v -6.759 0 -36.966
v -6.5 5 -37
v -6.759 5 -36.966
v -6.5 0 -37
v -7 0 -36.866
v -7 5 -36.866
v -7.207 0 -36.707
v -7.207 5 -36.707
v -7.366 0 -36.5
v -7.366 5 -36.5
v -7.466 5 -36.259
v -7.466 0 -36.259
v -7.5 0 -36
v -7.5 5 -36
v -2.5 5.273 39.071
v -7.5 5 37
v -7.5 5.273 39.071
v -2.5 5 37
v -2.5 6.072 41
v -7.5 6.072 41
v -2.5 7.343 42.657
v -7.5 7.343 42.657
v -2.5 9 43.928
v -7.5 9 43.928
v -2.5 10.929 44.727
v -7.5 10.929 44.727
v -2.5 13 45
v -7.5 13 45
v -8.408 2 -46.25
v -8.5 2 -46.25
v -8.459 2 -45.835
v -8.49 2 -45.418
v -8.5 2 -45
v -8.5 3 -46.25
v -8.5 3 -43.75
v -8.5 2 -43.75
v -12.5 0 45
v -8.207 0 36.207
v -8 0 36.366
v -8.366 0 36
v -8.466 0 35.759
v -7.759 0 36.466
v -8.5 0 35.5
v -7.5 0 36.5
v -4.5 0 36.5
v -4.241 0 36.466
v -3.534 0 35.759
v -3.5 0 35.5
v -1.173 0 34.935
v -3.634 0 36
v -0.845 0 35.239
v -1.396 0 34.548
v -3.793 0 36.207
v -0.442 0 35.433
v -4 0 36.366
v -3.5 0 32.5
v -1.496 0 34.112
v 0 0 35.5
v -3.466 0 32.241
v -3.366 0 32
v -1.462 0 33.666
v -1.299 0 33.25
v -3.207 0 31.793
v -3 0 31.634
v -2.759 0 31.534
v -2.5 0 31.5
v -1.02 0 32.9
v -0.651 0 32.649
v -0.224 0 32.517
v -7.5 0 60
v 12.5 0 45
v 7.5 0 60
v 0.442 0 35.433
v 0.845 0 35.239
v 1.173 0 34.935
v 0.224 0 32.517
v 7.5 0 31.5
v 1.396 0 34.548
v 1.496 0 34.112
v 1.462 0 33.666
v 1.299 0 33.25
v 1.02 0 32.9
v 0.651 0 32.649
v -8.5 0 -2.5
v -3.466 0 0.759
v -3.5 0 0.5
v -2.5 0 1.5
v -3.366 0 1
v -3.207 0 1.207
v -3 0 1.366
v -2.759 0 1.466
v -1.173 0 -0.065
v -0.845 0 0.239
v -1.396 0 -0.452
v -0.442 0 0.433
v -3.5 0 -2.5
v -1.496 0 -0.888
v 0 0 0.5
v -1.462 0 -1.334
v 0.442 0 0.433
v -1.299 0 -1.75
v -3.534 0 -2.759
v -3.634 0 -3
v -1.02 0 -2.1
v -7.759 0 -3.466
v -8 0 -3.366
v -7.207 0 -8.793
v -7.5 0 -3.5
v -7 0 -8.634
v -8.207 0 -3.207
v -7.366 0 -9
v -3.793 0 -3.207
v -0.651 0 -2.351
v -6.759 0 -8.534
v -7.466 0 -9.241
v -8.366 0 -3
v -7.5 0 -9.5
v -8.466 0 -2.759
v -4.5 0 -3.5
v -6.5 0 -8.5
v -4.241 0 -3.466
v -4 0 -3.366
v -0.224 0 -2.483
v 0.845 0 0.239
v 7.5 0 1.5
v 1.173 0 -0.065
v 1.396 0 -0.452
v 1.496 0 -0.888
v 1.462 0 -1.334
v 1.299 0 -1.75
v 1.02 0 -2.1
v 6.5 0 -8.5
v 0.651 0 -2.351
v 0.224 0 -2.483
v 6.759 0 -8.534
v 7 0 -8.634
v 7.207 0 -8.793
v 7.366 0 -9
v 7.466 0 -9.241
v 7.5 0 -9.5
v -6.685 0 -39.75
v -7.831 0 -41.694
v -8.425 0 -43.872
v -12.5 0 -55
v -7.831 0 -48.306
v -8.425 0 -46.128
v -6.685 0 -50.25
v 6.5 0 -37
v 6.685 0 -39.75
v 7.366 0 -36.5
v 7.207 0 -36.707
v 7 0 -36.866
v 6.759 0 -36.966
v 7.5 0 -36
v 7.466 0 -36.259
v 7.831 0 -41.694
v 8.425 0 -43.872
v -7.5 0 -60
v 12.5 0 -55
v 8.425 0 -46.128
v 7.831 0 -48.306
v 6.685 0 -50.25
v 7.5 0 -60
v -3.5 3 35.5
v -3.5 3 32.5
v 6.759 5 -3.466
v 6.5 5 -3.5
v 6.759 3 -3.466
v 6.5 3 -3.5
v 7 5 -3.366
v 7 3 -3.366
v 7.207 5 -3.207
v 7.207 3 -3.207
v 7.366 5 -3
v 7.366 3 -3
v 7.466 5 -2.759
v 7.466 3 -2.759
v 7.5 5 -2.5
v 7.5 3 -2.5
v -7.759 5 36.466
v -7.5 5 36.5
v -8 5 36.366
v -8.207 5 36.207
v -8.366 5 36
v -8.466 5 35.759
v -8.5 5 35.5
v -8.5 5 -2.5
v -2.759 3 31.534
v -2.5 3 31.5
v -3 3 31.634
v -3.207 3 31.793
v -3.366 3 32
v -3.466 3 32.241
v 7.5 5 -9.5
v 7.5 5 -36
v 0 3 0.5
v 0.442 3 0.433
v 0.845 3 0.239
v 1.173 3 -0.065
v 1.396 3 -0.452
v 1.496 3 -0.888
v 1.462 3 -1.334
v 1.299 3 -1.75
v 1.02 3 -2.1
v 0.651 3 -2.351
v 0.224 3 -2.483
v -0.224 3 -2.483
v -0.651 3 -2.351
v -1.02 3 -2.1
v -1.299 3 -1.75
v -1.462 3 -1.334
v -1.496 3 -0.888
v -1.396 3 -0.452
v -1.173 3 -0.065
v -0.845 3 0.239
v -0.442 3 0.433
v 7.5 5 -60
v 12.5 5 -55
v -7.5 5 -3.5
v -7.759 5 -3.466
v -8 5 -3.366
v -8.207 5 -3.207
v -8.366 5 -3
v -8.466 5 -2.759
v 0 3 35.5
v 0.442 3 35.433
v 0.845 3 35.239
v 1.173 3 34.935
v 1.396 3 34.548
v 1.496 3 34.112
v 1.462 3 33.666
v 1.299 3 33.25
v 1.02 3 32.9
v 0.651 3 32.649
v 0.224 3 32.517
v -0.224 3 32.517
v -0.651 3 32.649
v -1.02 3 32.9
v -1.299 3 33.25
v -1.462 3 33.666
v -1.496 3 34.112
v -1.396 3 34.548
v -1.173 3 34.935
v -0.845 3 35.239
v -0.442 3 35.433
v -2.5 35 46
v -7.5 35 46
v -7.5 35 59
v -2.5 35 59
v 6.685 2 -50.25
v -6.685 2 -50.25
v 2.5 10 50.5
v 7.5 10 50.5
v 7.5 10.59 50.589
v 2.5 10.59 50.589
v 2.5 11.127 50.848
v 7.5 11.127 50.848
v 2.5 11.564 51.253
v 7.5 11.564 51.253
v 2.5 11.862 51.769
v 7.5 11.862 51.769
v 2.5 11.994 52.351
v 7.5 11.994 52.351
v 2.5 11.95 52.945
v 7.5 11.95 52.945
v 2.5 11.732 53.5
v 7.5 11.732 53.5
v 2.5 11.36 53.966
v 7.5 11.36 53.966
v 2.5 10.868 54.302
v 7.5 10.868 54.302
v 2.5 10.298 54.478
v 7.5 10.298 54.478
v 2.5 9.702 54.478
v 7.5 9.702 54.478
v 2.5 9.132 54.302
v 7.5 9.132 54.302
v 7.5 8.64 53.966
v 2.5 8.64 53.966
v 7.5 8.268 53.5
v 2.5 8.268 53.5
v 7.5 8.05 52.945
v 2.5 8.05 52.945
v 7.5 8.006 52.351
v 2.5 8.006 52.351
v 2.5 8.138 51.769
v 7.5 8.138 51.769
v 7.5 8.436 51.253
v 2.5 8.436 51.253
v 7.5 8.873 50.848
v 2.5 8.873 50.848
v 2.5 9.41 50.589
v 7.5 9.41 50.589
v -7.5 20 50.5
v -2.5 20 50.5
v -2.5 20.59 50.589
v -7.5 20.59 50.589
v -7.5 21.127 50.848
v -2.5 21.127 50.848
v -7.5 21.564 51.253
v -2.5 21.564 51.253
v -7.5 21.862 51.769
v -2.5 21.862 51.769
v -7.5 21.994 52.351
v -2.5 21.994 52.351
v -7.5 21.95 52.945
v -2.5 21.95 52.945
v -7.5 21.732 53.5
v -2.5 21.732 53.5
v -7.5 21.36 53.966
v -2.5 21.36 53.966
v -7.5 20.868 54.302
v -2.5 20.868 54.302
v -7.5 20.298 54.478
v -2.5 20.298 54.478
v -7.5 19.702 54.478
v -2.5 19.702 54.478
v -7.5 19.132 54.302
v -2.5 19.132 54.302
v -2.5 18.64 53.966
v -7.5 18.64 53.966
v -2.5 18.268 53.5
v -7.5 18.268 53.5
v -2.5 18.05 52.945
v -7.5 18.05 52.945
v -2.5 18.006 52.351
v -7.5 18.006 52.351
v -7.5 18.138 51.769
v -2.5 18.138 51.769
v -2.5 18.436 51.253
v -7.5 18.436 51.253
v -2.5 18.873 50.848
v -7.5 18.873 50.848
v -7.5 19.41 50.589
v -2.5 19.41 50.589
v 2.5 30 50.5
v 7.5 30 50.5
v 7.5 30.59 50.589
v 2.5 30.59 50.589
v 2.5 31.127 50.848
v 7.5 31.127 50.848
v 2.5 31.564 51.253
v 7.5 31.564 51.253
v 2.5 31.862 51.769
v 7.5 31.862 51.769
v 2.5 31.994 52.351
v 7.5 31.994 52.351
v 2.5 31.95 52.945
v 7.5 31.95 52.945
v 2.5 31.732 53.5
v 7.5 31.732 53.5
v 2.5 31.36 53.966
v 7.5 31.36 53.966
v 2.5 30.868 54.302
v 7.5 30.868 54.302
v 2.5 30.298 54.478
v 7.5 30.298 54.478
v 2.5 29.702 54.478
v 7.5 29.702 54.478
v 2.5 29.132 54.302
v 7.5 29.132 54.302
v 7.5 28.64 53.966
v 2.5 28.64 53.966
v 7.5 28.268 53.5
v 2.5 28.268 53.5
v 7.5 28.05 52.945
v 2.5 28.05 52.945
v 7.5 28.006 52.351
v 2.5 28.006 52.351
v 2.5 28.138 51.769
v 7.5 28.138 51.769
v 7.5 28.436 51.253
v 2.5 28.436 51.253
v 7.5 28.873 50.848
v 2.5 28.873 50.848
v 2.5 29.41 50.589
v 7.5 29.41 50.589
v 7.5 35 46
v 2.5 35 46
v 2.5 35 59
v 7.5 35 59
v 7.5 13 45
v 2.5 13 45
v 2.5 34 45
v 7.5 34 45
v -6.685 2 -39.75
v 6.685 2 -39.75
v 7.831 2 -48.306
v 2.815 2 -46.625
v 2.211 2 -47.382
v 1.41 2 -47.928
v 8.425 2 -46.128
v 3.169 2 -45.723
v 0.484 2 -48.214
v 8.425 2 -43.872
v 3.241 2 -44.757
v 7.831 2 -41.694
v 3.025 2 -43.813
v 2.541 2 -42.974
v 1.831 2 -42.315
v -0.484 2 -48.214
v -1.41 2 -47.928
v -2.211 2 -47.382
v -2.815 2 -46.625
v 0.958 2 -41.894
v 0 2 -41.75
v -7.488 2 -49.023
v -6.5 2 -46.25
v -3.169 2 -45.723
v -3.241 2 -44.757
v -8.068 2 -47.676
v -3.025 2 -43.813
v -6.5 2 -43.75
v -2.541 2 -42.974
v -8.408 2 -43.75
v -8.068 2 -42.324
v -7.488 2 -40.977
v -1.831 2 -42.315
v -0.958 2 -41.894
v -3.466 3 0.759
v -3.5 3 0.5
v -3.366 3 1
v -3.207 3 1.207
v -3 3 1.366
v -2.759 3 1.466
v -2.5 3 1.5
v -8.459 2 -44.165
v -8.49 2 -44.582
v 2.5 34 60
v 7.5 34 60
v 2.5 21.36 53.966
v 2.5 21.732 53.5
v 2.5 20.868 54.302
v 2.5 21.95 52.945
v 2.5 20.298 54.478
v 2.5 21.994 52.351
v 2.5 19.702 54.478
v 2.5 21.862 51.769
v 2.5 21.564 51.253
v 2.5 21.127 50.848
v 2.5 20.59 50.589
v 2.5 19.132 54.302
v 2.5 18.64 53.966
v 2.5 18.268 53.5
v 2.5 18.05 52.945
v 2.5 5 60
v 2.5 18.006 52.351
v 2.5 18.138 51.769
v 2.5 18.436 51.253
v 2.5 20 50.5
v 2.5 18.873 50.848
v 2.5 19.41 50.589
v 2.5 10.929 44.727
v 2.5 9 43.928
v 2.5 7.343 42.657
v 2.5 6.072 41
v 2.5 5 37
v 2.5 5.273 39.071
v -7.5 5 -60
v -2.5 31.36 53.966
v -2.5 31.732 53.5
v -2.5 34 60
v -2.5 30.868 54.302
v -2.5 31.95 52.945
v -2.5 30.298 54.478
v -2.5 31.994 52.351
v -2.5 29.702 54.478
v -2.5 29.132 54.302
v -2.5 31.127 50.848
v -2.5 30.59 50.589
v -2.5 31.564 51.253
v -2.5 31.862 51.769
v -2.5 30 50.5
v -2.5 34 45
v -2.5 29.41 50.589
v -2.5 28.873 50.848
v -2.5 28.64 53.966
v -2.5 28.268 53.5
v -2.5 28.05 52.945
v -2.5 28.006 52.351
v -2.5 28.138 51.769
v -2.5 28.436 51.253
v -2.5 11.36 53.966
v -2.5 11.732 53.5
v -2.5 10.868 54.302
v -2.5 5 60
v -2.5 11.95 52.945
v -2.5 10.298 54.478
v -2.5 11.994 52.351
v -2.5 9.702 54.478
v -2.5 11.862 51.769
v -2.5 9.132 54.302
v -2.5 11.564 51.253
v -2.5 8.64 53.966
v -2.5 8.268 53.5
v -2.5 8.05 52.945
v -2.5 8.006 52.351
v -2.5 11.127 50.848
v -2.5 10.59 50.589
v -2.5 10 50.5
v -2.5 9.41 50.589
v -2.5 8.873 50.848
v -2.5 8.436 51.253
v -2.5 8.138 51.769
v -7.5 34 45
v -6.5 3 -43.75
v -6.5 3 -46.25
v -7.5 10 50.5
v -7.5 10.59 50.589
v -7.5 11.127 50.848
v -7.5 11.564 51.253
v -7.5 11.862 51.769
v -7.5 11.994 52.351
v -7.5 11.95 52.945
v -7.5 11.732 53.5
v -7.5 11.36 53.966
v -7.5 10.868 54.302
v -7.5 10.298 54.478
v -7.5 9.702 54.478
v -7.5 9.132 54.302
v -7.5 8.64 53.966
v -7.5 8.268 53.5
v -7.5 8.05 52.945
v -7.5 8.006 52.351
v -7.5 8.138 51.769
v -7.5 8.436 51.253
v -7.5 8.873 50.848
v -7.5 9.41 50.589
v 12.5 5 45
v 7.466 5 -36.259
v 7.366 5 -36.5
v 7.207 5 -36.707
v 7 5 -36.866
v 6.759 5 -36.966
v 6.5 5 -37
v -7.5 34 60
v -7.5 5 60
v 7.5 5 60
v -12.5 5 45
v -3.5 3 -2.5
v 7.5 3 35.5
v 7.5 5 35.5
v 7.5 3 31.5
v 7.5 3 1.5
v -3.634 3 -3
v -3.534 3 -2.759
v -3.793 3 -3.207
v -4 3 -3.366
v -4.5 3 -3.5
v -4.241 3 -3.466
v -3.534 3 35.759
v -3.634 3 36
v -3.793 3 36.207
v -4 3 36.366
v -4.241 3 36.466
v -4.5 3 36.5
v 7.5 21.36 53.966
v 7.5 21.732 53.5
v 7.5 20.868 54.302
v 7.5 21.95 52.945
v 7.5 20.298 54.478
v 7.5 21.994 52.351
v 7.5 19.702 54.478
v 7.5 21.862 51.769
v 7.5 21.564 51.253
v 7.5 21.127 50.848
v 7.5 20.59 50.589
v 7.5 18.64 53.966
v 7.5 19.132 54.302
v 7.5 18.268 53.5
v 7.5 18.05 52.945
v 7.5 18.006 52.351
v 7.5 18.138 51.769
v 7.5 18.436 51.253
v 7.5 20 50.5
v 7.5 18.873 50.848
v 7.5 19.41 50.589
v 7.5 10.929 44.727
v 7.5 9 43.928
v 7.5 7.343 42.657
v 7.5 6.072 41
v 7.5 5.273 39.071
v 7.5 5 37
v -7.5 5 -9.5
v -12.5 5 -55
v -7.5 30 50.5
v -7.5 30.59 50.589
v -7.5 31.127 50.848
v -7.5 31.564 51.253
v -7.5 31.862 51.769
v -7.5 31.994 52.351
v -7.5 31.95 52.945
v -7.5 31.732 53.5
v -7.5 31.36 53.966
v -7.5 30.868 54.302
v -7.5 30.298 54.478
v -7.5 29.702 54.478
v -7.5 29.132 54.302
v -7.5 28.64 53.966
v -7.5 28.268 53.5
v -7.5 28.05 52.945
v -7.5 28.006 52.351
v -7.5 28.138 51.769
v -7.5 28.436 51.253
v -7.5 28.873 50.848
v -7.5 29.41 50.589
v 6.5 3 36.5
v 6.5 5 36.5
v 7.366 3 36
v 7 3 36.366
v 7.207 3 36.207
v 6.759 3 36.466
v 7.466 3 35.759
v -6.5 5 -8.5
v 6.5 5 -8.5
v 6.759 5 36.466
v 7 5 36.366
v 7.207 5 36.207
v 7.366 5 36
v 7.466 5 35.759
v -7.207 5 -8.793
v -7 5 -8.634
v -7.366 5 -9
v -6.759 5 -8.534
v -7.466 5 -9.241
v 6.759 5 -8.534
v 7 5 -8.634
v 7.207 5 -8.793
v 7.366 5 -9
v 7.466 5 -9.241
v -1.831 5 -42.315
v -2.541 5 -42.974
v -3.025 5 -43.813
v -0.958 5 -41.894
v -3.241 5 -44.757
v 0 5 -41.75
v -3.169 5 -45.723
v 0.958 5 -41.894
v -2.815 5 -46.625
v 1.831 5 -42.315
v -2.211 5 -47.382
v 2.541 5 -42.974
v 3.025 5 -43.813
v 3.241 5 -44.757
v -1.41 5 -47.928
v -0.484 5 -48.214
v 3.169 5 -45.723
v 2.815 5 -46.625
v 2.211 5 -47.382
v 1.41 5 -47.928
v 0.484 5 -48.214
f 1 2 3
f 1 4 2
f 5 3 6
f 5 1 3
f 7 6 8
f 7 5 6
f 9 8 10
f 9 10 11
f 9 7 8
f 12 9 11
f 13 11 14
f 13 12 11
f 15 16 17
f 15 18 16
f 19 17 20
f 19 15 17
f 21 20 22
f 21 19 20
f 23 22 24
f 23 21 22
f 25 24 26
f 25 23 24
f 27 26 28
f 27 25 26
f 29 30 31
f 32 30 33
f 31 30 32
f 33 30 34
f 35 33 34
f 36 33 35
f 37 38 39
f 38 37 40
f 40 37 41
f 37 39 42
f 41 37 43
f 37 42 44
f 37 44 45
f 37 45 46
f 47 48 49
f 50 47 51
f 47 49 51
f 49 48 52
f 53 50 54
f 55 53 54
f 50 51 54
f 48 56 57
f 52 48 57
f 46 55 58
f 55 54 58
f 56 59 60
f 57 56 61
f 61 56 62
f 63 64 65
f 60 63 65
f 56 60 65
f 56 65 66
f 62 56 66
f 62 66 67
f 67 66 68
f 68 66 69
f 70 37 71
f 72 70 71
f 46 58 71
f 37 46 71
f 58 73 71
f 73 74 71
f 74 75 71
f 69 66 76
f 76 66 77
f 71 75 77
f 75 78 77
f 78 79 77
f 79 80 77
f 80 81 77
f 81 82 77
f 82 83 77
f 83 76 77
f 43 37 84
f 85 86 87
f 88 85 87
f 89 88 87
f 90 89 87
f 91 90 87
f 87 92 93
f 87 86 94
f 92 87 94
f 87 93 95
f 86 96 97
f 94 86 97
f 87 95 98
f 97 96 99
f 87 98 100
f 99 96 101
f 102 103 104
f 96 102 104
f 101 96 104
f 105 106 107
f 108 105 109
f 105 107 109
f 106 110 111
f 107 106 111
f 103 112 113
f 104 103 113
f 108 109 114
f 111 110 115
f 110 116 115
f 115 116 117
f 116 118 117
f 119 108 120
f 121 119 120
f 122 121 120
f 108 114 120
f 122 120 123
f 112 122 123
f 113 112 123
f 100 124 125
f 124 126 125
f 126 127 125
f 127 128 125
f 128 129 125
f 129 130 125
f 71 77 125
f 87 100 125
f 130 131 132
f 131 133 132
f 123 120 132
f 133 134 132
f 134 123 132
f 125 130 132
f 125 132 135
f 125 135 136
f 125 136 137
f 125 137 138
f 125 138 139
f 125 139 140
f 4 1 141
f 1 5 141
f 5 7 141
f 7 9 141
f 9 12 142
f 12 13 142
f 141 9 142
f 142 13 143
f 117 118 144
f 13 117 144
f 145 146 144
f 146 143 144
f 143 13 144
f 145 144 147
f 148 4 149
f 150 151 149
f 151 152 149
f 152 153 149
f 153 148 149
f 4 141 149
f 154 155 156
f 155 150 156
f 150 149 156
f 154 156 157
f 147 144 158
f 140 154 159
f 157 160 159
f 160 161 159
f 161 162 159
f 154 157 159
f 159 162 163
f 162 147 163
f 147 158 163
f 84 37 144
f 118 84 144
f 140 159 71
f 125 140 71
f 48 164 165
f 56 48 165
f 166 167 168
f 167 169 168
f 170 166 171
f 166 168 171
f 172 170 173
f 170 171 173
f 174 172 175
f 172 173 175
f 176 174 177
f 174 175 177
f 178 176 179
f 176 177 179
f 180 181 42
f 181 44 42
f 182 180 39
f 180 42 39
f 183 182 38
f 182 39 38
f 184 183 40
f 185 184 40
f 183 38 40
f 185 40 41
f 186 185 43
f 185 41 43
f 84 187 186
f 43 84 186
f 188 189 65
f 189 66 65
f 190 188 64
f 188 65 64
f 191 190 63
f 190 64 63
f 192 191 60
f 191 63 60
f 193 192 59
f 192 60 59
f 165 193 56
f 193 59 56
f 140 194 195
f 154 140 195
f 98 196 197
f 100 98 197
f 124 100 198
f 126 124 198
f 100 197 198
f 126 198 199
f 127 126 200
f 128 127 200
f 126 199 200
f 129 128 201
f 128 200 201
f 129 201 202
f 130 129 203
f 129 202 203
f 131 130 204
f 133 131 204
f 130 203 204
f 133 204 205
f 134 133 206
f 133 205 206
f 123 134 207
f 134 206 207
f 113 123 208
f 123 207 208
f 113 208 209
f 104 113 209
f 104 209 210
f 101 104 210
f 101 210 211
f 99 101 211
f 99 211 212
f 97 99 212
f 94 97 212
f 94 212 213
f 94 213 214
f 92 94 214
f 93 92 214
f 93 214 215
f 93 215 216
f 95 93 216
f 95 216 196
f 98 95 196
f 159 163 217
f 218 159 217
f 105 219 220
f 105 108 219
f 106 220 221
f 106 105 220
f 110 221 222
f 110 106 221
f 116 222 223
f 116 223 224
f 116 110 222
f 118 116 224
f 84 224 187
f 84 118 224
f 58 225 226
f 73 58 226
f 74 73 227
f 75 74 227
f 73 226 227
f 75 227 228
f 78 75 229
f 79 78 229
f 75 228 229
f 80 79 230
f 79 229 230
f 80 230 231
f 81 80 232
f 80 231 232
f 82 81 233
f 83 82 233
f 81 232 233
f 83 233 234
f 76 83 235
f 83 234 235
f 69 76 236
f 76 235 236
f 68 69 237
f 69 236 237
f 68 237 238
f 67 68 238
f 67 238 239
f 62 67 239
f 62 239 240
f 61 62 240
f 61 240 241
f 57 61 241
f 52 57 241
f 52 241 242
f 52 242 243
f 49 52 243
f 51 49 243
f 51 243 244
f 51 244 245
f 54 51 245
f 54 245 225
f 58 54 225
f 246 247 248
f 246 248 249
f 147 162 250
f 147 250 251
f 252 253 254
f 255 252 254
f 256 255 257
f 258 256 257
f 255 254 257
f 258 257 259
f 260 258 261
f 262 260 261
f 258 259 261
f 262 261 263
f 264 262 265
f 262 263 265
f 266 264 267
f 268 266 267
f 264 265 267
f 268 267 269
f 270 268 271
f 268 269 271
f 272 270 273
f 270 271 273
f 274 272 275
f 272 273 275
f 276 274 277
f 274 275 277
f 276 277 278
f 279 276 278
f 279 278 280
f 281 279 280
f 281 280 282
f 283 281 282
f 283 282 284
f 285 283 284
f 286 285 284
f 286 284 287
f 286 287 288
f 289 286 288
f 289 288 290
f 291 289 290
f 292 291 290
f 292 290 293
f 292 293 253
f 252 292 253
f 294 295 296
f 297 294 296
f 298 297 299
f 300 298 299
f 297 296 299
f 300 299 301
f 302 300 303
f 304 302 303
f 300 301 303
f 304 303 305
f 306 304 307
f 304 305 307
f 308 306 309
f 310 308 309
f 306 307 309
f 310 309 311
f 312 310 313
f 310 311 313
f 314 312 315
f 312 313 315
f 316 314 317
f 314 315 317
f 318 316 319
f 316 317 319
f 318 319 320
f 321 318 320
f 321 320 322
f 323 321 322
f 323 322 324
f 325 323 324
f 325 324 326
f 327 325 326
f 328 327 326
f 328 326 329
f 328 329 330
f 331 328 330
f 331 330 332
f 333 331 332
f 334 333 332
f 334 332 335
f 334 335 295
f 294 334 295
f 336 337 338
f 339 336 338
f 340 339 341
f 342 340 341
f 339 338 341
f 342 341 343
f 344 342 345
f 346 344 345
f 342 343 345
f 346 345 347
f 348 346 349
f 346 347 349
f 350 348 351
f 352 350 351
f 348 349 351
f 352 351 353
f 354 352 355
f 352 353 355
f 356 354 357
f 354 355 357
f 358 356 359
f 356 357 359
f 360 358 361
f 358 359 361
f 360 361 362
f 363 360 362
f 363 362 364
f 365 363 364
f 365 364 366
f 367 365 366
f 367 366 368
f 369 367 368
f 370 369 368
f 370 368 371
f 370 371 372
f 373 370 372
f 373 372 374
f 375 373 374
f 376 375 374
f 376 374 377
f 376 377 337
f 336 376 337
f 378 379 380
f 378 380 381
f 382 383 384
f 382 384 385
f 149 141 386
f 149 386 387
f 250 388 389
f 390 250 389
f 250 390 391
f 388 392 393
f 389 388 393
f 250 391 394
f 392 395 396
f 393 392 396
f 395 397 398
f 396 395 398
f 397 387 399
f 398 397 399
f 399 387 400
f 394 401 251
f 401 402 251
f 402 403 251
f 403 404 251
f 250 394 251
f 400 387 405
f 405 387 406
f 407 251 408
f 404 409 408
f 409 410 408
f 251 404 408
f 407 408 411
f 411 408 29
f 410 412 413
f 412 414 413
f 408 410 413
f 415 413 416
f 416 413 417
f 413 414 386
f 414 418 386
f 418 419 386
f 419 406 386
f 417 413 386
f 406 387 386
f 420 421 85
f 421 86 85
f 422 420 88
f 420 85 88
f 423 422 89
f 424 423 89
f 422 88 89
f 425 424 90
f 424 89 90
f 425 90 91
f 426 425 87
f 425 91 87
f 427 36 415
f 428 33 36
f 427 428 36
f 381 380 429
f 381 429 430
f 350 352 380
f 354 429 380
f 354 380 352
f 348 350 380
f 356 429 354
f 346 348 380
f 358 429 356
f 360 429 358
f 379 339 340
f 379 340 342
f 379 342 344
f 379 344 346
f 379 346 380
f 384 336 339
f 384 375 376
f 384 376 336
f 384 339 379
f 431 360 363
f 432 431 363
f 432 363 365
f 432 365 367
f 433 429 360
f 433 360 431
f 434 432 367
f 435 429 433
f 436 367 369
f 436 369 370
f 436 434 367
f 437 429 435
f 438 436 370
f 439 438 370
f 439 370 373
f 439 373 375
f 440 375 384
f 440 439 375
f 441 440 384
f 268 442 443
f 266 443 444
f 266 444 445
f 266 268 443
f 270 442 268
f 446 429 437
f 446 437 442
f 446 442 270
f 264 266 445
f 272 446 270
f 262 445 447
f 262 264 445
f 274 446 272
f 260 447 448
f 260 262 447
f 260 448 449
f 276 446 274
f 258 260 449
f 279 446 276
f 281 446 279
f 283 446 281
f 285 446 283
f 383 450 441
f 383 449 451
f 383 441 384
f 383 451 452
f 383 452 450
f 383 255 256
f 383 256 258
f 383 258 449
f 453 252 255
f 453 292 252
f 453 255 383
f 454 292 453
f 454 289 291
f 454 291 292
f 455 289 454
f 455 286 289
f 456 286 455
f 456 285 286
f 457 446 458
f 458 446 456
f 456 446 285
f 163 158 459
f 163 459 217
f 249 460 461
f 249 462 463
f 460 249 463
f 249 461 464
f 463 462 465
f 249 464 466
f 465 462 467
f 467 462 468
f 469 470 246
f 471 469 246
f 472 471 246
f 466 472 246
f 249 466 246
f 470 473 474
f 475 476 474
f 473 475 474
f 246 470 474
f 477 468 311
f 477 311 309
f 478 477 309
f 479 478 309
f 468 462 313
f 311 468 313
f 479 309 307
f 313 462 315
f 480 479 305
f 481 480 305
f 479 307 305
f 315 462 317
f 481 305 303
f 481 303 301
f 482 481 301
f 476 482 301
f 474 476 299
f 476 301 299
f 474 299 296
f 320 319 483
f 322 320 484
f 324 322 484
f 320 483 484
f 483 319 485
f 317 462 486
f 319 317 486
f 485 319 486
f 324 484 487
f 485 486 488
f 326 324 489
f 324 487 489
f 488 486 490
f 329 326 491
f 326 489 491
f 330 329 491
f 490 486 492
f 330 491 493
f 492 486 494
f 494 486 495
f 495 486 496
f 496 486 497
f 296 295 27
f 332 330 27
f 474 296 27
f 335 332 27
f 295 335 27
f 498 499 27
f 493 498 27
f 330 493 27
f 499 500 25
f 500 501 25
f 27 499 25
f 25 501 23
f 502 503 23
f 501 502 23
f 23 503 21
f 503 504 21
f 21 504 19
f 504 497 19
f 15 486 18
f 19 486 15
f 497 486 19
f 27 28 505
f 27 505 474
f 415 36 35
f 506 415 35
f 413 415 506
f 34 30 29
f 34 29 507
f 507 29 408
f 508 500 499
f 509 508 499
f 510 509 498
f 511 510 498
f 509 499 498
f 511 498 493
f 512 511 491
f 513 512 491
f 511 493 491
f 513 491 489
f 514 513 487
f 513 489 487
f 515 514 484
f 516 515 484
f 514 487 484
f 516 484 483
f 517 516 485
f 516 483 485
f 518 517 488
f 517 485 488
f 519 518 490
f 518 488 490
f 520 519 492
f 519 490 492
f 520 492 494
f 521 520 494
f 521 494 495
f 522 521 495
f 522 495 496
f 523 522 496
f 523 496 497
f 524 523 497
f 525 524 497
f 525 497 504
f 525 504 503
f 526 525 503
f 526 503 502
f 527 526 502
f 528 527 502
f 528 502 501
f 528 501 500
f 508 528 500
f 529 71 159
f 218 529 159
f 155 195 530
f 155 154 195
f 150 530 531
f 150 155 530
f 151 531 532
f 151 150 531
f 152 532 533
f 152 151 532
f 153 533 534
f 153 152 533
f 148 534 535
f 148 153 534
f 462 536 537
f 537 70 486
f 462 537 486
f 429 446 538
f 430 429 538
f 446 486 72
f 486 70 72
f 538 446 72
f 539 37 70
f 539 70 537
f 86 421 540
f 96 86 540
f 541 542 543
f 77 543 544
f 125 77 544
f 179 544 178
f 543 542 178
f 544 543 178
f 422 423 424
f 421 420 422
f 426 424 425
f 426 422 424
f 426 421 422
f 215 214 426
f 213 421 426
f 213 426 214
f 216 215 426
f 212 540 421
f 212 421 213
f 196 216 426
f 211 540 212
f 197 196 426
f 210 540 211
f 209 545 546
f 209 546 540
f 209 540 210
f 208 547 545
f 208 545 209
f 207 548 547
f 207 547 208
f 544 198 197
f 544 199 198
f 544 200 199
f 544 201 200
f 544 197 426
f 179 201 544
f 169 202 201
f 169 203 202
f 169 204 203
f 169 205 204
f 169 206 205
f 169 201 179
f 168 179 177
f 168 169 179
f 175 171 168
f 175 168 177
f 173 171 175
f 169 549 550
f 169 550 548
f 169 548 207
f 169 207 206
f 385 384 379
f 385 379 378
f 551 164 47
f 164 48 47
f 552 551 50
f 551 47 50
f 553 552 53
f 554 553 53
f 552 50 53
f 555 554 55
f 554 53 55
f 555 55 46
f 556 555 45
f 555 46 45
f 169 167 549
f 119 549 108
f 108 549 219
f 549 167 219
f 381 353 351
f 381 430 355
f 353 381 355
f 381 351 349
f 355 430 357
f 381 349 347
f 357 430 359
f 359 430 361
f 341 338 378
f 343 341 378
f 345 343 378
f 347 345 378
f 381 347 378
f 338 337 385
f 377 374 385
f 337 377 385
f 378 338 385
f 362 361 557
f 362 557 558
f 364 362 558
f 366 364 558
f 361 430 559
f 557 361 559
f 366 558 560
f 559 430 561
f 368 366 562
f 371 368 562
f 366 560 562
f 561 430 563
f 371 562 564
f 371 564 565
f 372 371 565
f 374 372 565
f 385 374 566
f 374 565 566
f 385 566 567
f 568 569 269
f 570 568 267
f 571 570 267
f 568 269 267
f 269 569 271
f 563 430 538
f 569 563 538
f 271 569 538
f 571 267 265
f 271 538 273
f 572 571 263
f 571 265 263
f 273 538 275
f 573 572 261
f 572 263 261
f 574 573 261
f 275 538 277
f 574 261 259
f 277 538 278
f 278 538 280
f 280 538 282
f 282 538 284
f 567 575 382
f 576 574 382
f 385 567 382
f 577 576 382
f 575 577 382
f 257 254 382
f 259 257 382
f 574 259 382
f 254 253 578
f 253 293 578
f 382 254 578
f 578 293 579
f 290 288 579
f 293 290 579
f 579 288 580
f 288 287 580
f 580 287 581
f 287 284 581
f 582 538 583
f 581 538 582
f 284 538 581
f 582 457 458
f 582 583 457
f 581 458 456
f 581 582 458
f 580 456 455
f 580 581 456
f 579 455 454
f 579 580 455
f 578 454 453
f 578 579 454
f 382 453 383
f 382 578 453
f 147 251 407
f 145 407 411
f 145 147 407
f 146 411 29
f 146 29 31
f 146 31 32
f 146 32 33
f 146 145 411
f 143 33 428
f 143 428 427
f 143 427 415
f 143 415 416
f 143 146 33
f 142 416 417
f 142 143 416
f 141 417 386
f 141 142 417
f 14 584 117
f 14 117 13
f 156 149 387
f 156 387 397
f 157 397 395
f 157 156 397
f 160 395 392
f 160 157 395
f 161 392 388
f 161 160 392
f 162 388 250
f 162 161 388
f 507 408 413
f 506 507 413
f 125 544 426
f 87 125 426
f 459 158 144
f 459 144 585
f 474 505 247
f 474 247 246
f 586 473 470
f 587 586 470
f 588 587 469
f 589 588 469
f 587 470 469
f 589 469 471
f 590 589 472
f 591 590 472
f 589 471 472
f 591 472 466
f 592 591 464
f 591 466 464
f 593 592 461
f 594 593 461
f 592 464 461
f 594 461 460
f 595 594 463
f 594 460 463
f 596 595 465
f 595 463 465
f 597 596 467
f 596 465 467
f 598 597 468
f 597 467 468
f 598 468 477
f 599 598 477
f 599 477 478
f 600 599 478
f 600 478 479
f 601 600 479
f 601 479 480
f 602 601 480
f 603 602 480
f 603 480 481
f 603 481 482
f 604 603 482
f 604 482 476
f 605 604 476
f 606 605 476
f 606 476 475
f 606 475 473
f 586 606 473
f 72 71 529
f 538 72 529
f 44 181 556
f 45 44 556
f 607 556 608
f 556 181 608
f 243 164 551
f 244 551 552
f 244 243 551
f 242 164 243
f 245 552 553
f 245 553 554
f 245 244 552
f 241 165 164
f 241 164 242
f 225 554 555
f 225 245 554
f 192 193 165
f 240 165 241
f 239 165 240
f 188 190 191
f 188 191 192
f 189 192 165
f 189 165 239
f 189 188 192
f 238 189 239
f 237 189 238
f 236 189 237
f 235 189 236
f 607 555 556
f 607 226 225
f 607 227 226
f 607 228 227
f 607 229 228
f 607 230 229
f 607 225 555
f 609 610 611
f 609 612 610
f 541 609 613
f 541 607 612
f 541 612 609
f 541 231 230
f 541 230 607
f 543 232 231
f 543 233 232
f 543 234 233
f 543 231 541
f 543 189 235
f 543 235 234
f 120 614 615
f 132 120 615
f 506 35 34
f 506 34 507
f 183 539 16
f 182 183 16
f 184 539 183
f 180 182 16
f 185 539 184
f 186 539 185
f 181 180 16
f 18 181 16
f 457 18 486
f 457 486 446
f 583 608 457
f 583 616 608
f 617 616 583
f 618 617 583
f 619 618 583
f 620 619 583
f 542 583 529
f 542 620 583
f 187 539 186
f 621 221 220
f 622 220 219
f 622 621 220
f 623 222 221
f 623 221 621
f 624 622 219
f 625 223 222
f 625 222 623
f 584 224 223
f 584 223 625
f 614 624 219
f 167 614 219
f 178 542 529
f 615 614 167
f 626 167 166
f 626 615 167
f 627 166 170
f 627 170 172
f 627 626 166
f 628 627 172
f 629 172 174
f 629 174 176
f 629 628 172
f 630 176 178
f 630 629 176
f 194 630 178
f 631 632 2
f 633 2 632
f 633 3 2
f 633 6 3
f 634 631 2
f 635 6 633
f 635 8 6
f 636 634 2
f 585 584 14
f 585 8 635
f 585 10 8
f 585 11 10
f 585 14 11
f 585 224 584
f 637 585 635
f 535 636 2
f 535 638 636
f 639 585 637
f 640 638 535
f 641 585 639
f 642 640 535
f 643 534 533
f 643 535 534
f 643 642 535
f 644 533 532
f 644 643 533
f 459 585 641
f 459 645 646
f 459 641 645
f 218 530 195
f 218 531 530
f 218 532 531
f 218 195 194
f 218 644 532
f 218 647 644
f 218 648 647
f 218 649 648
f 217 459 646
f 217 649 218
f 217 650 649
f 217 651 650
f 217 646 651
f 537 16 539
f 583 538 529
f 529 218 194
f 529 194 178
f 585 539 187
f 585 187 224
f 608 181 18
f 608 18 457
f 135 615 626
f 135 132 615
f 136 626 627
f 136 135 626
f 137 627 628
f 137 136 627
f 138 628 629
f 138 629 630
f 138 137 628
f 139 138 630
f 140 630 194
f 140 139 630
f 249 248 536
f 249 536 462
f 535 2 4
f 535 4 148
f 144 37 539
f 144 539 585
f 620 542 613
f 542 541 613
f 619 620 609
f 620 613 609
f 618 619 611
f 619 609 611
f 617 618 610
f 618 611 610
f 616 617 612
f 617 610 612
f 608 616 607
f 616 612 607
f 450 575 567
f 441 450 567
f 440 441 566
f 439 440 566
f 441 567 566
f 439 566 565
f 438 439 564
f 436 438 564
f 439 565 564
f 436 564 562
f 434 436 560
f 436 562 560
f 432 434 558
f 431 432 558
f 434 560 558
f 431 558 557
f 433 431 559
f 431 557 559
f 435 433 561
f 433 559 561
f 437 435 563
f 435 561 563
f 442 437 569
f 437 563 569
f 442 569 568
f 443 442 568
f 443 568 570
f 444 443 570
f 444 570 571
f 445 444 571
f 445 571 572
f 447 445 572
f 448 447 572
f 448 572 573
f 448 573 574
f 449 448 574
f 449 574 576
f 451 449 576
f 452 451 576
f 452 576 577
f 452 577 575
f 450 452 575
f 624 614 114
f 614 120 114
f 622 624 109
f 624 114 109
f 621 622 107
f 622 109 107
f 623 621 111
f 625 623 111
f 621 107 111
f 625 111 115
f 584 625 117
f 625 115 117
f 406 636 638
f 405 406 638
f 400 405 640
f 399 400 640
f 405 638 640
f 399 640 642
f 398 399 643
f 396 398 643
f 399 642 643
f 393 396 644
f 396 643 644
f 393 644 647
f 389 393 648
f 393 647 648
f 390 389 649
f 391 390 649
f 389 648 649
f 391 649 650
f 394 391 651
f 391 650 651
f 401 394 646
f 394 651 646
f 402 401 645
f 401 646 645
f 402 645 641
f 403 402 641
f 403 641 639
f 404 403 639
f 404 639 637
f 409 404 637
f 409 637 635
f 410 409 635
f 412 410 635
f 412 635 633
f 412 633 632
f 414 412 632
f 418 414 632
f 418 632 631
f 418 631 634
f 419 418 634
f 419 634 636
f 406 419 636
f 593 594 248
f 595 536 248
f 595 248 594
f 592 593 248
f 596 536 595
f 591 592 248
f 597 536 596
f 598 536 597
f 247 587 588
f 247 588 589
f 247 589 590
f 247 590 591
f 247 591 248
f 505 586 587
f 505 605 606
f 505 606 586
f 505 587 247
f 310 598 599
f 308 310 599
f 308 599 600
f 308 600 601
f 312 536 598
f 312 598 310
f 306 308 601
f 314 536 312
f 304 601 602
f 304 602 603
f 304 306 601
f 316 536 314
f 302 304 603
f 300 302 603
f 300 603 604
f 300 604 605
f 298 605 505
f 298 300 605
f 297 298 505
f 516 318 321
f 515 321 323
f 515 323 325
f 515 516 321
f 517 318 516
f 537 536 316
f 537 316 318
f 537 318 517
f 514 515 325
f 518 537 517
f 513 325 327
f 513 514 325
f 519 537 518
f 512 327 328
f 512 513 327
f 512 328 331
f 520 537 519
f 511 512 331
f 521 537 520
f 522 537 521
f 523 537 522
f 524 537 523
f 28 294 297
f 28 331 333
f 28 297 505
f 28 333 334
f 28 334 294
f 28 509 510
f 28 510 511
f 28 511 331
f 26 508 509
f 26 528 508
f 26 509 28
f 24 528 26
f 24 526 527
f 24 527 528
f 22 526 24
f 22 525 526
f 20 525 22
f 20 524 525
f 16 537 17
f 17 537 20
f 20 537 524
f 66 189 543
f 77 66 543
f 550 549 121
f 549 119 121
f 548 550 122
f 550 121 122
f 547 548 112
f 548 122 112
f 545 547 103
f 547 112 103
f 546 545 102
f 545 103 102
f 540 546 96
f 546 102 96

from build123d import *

# Parameters (mm, degrees)
SKETCH1_W           = 25
SKETCH1_H           = 120
BOSS_EXTRUDE1_DEPTH = 5
SKETCH2_W           = 5
SKETCH2_H           = 15
BOSS_EXTRUDE2_DEPTH = 30
CHAMFER1_SIZE       = 5
CHAMFER1_SIZE2      = 15
CHAMFER2_SIZE       = 15
CHAMFER2_SIZE2      = 5
CHAMFER3_SIZE       = 1
CHAMFER4_SIZE       = 5
CUT_EXTRUDE1_DEPTH  = 69.23672032
SKETCH3_3_W         = 11
SKETCH3_3_H         = 5
CUT_EXTRUDE2_DEPTH  = 2
FILLET1_R           = 1
SKETCH4_R           = 1.5
CUT_EXTRUDE3_DEPTH  = 70.139352036
FILLET2_R           = 8
SKETCH6_R           = 3.25
CUT_EXTRUDE5_DEPTH  = 69.23672032
CUT_EXTRUDE6_DEPTH  = 2
SKETCH8_W           = 2
SKETCH8_H           = 2.5
CUT_EXTRUDE7_DEPTH  = 1
SKETCH9_R           = 2
CUT_EXTRUDE8_DEPTH  = 73.284161474
SKETCH10_W          = 15
SKETCH10_H          = 28.5
CUT_EXTRUDE9_DEPTH  = 69.23672032
FILLET3_R           = 1


with BuildPart() as part:
    # Sketch1 → Boss-Extrude1 (new body)
    with BuildSketch(Plane(origin=(0, 0, 0), x_dir=(1, 0, 0), z_dir=(0, 1, 0))):
        Rectangle(SKETCH1_W, SKETCH1_H)
    extrude(amount=BOSS_EXTRUDE1_DEPTH)

    # Sketch2 → Boss-Extrude2 (add)
    with BuildSketch(Plane(origin=(0, 5, 0), x_dir=(1, 0, 0), z_dir=(0, 1, 0))):
        with Locations((-5, -52.5)):
            Rectangle(SKETCH2_W, SKETCH2_H)
        with Locations((5, -52.5)):
            Rectangle(SKETCH2_W, SKETCH2_H)
    extrude(amount=BOSS_EXTRUDE2_DEPTH)

    # Chamfer1
    chamfer1_edges = [part.edges().sort_by_distance(p)[0] for p in [
        (12.5, 2.5, 60),
    ]]
    chamfer1_side = [part.faces().sort_by_distance(p)[0] for p in [
        (-12.069883737, 2.5, 60),
    ]]
    chamfer(chamfer1_edges, length=CHAMFER1_SIZE, length2=CHAMFER1_SIZE2, reference=chamfer1_side[0])

    # Chamfer2
    chamfer2_edges = [part.edges().sort_by_distance(p)[0] for p in [
        (-12.5, 2.5, 60),
    ]]
    chamfer2_side = [part.faces().sort_by_distance(p)[0] for p in [
        (-12.5, 2.5, 0),
    ]]
    chamfer(chamfer2_edges, length=CHAMFER2_SIZE, length2=CHAMFER2_SIZE2, reference=chamfer2_side[0])

    # Chamfer3
    chamfer3_edges = [part.edges().sort_by_distance(p)[0] for p in [
        (5, 35, 60),
        (-5, 35, 60),
        (-5, 35, 45),
        (5, 35, 45),
    ]]
    chamfer(chamfer3_edges, length=CHAMFER3_SIZE)

    # Chamfer4
    chamfer4_edges = [part.edges().sort_by_distance(p)[0] for p in [
        (-12.5, 2.5, -60),
        (12.5, 2.5, -60),
    ]]
    chamfer(chamfer4_edges, length=CHAMFER4_SIZE)

    # Sketch3 → Cut-Extrude1 (cut, through all)
    with BuildSketch(Plane(origin=(0, 5, 0), x_dir=(1, 0, 0), z_dir=(0, 1, 0))):
        Polygon((-8.5, 3.5), (-8.5, -36.5), (-3.5, -36.5), (-3.5, -31.5), (7.5, -31.5), (7.5, -1.5), (-3.5, -1.5), (-3.5, 3.5), align=None)
    extrude(amount=-CUT_EXTRUDE1_DEPTH, mode=Mode.SUBTRACT)

    # Sketch3<3> → Cut-Extrude2 (cut)
    with BuildSketch(Plane(origin=(0, 5, 0), x_dir=(1, 0, 0), z_dir=(0, 1, 0))):
        with Locations((2, -34)):
            Rectangle(SKETCH3_3_W, SKETCH3_3_H)
        with Locations((2, 1)):
            Rectangle(SKETCH3_3_W, SKETCH3_3_H)
    extrude(amount=-CUT_EXTRUDE2_DEPTH, mode=Mode.SUBTRACT)

    # Fillet1
    fillet1_edges = [part.edges().sort_by_distance(p)[0] for p in [
        (7.5, 4, 36.5),
        (-3.5, 1.5, 31.5),
        (-3.5, 1.5, 36.5),
        (-8.5, 2.5, 36.5),
        (-3.5, 1.5, 1.5),
        (-3.5, 1.5, -3.5),
        (7.5, 4, -3.5),
        (-8.5, 2.5, -3.5),
    ]]
    fillet(fillet1_edges, radius=FILLET1_R)

    # Sketch4 → Cut-Extrude3 (cut, through all)
    with BuildSketch(Plane(origin=(0, 3, 0), x_dir=(1, 0, 0), z_dir=(0, 1, 0))):
        with Locations((0, 1)):
            Circle(SKETCH4_R)
        with Locations((0, -34)):
            Circle(SKETCH4_R)
    extrude(amount=-CUT_EXTRUDE3_DEPTH, mode=Mode.SUBTRACT)

    # Fillet2
    fillet2_edges = [part.edges().sort_by_distance(p)[0] for p in [
        (-5, 5, 45),
        (5, 5, 45),
    ]]
    fillet(fillet2_edges, radius=FILLET2_R)

    # Sketch6 → Cut-Extrude5 (cut, through all)
    with BuildSketch(Plane(origin=(0, 5, 0), x_dir=(1, 0, 0), z_dir=(0, 1, 0))):
        with Locations((0, 45)):
            Circle(SKETCH6_R)
    extrude(amount=-CUT_EXTRUDE5_DEPTH, mode=Mode.SUBTRACT)

    # Sketch7 → Cut-Extrude6 (cut)
    with BuildSketch(Plane.XZ):
        with BuildLine():
            Line((-6.684870979, -39.75), (6.684870979, -39.75))
            ThreePointArc((6.684870979, -39.75), (8.5, -45), (6.684870979, -50.25))
            Line((6.684870979, -50.25), (-6.684870979, -50.25))
            ThreePointArc((-6.684870979, -50.25), (-8.5, -45), (-6.684870979, -39.75))
        make_face()
    extrude(amount=-CUT_EXTRUDE6_DEPTH, mode=Mode.SUBTRACT)

    # Sketch8 → Cut-Extrude7 (cut)
    with BuildSketch(Plane.XZ.offset(-2)):
        with Locations((-7.5, -45)):
            Rectangle(SKETCH8_W, SKETCH8_H)
    extrude(amount=-CUT_EXTRUDE7_DEPTH, mode=Mode.SUBTRACT)

    # Sketch9 → Cut-Extrude8 (cut, through all)
    with BuildSketch(Plane(origin=(7.5, 0, 0), x_dir=(0, 0, -1), z_dir=(1, 0, 0))):
        with Locations((-52.5, 30)):
            Circle(SKETCH9_R)
        with Locations((-52.5, 20)):
            Circle(SKETCH9_R)
        with Locations((-52.5, 10)):
            Circle(SKETCH9_R)
    extrude(amount=-CUT_EXTRUDE8_DEPTH, mode=Mode.SUBTRACT)

    # Sketch10 → Cut-Extrude9 (cut, through all)
    with BuildSketch(Plane(origin=(0, 5, 0), x_dir=(1, 0, 0), z_dir=(0, 1, 0))):
        with Locations((0, 22.75)):
            Rectangle(SKETCH10_W, SKETCH10_H)
    extrude(amount=-CUT_EXTRUDE9_DEPTH, mode=Mode.SUBTRACT)

    # Fillet3
    fillet3_edges = [part.edges().sort_by_distance(p)[0] for p in [
        (-7.5, 2.5, -8.5),
        (7.5, 2.5, -8.5),
        (7.5, 2.5, -37),
        (-7.5, 2.5, -37),
    ]]
    fillet(fillet3_edges, radius=FILLET3_R)


solid = part.part
